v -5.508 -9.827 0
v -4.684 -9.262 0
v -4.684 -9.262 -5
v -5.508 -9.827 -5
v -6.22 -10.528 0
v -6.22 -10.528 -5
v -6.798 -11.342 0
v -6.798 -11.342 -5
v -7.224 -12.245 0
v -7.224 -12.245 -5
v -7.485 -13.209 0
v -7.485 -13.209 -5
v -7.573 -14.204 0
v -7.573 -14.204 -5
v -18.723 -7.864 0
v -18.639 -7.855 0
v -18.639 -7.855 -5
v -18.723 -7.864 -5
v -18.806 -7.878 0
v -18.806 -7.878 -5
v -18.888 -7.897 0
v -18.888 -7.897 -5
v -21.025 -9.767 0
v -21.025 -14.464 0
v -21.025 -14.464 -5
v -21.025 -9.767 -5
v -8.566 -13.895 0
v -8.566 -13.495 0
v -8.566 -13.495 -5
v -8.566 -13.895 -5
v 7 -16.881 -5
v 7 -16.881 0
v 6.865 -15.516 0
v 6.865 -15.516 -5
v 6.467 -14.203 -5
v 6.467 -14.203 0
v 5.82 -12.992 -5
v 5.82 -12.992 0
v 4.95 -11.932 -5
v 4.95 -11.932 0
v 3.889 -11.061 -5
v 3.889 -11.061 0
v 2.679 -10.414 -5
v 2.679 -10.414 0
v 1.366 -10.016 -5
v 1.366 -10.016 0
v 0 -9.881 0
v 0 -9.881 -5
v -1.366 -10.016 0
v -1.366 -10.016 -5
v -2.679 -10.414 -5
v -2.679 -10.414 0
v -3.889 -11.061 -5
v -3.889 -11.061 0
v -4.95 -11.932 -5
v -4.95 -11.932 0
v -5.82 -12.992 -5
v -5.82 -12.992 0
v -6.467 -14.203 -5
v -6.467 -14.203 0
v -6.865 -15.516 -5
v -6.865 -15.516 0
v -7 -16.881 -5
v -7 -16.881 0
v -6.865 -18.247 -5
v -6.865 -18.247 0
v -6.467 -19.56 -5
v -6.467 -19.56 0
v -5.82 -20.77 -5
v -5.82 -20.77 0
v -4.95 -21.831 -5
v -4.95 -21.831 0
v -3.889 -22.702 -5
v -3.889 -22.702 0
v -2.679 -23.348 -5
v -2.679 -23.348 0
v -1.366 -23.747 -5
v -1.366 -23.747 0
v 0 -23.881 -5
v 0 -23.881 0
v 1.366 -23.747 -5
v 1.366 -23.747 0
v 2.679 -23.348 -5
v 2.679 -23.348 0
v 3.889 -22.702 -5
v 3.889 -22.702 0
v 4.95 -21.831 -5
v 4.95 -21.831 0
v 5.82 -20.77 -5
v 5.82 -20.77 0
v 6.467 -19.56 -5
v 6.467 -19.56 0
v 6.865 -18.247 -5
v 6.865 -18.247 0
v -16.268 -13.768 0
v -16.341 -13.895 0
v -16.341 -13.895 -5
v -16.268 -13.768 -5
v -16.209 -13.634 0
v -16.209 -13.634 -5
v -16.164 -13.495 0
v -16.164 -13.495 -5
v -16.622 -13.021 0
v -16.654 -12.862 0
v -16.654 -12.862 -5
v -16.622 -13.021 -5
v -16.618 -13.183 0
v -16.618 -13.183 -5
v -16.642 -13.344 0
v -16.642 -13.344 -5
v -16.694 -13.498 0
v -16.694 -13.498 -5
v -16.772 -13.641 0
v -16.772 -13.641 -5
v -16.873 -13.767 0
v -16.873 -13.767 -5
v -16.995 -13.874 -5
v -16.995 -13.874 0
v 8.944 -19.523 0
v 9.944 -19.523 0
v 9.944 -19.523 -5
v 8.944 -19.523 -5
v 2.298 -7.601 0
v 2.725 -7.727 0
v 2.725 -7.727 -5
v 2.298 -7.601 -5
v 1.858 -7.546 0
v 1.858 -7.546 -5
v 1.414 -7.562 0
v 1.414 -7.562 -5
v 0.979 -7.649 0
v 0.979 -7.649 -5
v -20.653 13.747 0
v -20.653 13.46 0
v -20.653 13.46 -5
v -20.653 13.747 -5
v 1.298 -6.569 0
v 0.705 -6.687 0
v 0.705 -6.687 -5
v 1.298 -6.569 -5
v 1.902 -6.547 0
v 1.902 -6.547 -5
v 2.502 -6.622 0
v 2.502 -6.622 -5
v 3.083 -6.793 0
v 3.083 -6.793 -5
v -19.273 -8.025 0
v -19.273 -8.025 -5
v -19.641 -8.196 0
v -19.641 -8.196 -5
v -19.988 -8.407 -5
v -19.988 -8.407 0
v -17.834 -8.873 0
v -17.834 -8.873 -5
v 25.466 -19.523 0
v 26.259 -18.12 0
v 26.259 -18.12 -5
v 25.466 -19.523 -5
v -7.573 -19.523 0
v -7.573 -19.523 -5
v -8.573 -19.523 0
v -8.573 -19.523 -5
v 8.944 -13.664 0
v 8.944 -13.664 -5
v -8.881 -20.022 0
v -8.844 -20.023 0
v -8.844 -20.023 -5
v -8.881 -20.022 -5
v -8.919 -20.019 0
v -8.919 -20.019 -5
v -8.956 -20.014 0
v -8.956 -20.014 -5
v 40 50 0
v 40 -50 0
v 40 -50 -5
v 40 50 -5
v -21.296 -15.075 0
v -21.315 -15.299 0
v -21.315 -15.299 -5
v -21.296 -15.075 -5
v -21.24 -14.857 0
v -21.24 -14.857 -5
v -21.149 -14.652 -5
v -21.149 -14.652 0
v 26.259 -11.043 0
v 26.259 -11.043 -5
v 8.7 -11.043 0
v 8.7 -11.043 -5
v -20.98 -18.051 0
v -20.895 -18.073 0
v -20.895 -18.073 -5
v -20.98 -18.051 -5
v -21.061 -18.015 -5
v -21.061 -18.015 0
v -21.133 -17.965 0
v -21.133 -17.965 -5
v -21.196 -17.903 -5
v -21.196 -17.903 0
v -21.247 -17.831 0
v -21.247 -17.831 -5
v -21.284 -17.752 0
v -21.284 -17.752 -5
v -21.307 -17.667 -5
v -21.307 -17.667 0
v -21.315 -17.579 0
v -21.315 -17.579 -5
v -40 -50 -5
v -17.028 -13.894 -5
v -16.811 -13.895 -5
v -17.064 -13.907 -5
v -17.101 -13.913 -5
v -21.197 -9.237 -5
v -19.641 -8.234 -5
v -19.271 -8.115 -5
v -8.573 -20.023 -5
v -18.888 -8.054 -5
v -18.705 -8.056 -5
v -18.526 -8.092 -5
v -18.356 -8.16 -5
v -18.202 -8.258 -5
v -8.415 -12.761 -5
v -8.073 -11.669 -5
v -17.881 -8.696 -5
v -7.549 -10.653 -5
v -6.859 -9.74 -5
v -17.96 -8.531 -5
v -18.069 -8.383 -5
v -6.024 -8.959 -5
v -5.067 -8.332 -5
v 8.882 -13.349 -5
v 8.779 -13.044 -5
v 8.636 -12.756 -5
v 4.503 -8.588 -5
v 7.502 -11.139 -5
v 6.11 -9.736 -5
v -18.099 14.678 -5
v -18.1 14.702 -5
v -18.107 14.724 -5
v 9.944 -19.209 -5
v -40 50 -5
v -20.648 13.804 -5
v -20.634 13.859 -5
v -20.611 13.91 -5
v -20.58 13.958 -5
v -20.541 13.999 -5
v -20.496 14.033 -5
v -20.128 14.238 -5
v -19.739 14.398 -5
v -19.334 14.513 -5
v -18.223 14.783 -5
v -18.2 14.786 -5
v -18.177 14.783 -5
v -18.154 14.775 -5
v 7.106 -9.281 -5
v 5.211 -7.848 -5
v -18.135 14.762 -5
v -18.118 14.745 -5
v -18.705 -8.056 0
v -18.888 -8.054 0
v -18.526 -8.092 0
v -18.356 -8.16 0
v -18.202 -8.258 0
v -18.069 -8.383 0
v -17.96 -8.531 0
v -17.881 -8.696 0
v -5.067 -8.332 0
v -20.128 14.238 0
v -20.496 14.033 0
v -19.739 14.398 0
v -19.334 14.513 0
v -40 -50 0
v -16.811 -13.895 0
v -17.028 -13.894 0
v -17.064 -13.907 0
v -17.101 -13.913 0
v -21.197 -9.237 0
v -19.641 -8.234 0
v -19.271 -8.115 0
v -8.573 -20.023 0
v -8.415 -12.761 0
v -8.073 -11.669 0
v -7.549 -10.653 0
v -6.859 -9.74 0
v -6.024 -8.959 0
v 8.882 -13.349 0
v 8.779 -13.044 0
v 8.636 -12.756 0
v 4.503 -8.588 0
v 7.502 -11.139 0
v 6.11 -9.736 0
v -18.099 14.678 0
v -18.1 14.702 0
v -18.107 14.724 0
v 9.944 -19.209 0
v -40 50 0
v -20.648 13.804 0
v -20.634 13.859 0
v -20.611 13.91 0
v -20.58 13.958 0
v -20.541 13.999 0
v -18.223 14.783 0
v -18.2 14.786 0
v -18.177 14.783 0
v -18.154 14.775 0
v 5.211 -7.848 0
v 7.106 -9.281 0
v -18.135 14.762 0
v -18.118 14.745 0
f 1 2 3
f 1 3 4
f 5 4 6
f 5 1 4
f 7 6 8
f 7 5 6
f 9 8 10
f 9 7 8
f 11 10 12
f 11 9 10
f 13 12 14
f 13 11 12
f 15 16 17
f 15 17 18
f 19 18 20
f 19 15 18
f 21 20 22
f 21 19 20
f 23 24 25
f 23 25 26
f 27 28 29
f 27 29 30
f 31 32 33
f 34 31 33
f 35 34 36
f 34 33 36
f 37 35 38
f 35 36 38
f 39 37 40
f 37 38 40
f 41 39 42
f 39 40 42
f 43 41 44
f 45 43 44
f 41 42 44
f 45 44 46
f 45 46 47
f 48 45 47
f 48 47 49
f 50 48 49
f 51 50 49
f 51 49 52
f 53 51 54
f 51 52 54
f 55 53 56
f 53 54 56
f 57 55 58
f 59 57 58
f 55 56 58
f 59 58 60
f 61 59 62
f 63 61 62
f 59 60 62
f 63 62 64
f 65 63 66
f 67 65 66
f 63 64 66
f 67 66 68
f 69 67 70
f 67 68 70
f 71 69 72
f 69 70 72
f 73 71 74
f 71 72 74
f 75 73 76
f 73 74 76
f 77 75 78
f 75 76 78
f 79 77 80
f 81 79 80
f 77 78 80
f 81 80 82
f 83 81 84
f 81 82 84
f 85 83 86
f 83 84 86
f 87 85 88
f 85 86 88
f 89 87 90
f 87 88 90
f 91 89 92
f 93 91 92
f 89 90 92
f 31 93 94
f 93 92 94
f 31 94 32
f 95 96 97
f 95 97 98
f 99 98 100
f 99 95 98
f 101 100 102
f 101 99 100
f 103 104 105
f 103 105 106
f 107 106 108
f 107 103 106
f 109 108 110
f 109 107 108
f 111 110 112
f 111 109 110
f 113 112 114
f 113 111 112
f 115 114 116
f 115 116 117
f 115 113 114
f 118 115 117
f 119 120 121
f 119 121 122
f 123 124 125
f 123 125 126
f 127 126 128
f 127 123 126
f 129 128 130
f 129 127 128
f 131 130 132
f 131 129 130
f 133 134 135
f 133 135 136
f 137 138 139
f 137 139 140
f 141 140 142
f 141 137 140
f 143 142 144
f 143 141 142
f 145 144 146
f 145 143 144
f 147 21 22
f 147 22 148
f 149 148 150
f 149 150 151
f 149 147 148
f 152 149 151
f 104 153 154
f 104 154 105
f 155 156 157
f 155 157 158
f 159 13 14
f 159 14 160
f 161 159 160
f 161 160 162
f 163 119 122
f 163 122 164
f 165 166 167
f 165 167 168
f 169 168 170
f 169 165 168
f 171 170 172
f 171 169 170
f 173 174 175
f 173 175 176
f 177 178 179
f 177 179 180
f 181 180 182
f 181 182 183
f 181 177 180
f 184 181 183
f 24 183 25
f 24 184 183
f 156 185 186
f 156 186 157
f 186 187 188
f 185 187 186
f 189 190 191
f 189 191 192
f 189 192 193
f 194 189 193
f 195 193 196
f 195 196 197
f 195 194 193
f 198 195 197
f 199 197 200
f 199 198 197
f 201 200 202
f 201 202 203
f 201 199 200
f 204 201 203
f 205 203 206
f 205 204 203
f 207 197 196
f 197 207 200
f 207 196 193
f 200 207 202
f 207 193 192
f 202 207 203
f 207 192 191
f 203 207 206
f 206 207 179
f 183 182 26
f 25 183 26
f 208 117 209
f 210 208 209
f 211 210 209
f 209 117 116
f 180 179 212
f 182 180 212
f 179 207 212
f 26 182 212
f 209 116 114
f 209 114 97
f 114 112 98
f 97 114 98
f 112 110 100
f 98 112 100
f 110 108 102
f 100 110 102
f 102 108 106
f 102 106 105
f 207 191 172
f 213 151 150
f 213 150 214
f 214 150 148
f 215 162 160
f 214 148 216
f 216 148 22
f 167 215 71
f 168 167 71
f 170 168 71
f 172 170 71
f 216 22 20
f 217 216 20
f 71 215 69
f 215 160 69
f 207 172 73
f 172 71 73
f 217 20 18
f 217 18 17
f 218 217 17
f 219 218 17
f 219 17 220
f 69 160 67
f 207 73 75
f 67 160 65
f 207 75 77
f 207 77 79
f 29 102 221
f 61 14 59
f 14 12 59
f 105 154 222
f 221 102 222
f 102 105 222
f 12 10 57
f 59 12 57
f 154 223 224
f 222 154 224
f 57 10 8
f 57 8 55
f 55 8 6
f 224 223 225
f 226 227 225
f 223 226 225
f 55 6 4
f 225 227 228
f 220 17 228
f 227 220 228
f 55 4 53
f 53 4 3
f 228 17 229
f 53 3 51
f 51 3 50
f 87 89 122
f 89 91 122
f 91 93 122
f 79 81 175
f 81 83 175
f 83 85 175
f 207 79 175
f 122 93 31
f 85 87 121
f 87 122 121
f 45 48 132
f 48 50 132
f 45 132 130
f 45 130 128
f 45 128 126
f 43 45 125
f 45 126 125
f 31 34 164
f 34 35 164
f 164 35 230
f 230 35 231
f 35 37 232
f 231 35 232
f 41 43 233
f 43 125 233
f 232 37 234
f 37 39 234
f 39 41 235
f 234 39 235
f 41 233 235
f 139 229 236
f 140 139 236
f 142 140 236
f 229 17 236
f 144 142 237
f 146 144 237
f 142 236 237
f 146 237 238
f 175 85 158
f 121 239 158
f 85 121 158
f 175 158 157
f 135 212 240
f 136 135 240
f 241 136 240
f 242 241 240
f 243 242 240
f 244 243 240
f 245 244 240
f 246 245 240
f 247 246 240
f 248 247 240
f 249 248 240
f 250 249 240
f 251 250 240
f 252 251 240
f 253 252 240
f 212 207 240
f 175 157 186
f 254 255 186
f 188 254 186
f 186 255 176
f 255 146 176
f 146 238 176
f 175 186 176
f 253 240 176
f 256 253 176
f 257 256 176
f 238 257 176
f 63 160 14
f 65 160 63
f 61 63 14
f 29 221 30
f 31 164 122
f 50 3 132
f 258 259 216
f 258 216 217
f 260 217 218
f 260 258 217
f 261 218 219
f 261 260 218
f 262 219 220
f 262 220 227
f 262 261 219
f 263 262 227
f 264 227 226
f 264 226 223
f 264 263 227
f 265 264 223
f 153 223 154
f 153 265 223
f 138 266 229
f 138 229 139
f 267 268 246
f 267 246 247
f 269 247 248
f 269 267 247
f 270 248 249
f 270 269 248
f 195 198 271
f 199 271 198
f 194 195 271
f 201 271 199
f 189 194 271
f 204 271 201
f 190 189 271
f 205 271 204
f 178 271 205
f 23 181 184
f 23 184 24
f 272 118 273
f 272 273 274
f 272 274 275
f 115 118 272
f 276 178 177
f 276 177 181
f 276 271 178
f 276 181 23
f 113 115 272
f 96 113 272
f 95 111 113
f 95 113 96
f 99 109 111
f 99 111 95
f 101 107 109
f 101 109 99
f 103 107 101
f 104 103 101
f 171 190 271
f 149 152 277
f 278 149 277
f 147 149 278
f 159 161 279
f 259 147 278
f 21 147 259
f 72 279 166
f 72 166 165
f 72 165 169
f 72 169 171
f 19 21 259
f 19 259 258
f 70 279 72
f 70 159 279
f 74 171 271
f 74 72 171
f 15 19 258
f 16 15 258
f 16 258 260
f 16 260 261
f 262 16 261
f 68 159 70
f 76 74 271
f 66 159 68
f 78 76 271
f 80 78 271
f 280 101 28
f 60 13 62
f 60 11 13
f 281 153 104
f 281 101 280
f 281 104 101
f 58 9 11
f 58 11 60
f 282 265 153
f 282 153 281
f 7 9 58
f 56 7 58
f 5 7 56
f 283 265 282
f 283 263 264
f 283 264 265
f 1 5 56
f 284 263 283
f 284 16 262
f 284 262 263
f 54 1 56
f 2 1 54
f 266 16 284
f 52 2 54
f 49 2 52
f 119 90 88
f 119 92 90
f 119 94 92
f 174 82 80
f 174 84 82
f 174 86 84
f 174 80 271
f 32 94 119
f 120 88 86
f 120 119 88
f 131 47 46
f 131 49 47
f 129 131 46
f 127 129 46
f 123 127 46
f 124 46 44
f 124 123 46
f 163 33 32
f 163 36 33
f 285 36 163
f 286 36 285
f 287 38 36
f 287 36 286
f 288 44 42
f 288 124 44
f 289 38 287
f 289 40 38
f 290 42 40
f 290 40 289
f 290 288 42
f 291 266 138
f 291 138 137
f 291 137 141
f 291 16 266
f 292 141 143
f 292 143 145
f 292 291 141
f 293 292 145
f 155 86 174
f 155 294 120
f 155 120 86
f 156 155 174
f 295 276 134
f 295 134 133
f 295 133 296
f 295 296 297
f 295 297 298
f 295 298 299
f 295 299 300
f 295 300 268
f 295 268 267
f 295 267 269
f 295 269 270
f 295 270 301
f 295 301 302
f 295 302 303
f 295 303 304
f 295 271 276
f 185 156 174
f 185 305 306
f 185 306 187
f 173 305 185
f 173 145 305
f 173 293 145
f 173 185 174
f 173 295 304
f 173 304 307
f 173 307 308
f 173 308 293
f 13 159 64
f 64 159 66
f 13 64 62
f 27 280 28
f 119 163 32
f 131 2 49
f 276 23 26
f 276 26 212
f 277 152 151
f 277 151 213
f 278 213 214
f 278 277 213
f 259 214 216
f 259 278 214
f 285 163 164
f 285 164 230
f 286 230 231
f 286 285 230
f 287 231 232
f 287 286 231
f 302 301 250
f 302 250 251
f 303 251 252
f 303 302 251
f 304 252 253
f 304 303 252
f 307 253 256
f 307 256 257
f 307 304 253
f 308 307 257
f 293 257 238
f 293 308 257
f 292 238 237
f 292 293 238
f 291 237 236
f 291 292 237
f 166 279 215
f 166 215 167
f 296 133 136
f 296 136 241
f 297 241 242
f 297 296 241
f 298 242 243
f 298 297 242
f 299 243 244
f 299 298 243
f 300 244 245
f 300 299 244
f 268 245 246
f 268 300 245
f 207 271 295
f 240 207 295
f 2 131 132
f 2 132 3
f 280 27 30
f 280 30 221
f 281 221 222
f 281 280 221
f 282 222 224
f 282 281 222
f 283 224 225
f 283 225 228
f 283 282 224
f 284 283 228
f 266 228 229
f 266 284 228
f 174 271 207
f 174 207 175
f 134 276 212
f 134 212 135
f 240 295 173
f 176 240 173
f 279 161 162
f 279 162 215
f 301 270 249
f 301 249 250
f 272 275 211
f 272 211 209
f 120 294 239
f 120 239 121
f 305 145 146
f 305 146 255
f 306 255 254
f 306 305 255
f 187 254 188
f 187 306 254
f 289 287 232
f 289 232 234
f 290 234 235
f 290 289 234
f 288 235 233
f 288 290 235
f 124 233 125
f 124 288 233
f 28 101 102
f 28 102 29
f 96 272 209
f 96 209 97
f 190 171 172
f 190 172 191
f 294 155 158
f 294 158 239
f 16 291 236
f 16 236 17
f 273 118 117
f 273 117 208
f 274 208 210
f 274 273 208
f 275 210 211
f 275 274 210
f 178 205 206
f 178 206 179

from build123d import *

# Parameters (mm, degrees)
F0_W     = 80
F0_H     = 100
F0_R     = 7
F1_DEPTH = 5


with BuildPart() as f1:
    # F0 (on Top) → F1 (new body)
    with BuildSketch(Plane.XY):
        Rectangle(F0_W, F0_H)
        with Locations((0, -16.881289)):
            Circle(F0_R, mode=Mode.SUBTRACT)
        with BuildLine():
            Line((-7.573214, -14.20428), (-7.573214, -19.523358))
            Line((-7.573214, -19.523358), (-8.573214, -19.523358))
            Line((-8.573214, -19.523358), (-8.573214, -20.023358))
            Line((-8.573214, -20.023358), (-8.843749, -20.023358))
            ThreePointArc((-8.843749, -20.023358), (-8.900117, -20.021085), (-8.956119, -20.01428))
            Line((-8.956119, -20.01428), (-20.895163, -18.072539))
            ThreePointArc((-20.895163, -18.072539), (-21.195774, -17.902958), (-21.314899, -17.579023))
            Line((-21.314899, -17.579023), (-21.314899, -17.160009))
            Line((-21.314899, -17.160009), (-21.314899, -15.299222))
            ThreePointArc((-21.314899, -15.299222), (-21.24047, -14.857391), (-21.0254, -14.464328))
            Line((-21.0254, -14.464328), (-21.0254, -14.01055))
            Line((-21.0254, -14.01055), (-21.0254, -12.913586))
            Line((-21.0254, -12.913586), (-21.0254, -9.813586))
            Line((-21.0254, -9.813586), (-21.0254, -9.767418))
            Line((-21.0254, -9.767418), (-21.197006, -9.2368))
            Line((-21.197006, -9.2368), (-20.653205, 13.45957))
            Line((-20.653205, 13.45957), (-20.653205, 13.747156))
            ThreePointArc((-20.653205, 13.747156), (-20.61125, 13.910455), (-20.495776, 14.033308))
            ThreePointArc((-20.495776, 14.033308), (-19.935874, 14.323579), (-19.334331, 14.513035))
            Line((-19.334331, 14.513035), (-18.223464, 14.782686))
            ThreePointArc((-18.223464, 14.782686), (-18.134694, 14.76198), (-18.098606, 14.678275))
            Line((-18.098606, 14.678275), (-18.638507, -7.855344))
            ThreePointArc((-18.638507, -7.855344), (-18.764323, -7.869872), (-18.888049, -7.896943))
            ThreePointArc((-18.888049, -7.896943), (-19.459477, -8.105502), (-19.987784, -8.407029))
            ThreePointArc((-19.987784, -8.407029), (-19.458243, -8.167158), (-18.888049, -8.053886))
            ThreePointArc((-18.888049, -8.053886), (-18.201931, -8.25824), (-17.834234, -8.872502))
            Line((-17.834234, -8.872502), (-16.653947, -12.861871))
            ThreePointArc((-16.653947, -12.861871), (-16.664462, -13.422165), (-16.995338, -13.874449))
            ThreePointArc((-16.995338, -13.874449), (-17.045524, -13.901224), (-17.101217, -13.912787))
            Line((-17.101217, -13.912787), (-16.810631, -13.894739))
            Line((-16.810631, -13.894739), (-16.340575, -13.894739))
            ThreePointArc((-16.340575, -13.894739), (-16.237071, -13.701517), (-16.164339, -13.494739))
            Line((-16.164339, -13.494739), (-15.217034, -13.494739))
            Line((-15.217034, -13.494739), (-14.968154, -13.494739))
            Line((-14.968154, -13.494739), (-8.566029, -13.494739))
            Line((-8.566029, -13.494739), (-8.566029, -13.894739))
            ThreePointArc((-8.566029, -13.894739), (-7.549092, -10.652508), (-5.067064, -8.331785))
            Line((-5.067064, -8.331785), (0.704507, -6.687392))
            ThreePointArc((0.704507, -6.687392), (1.902164, -6.547103), (3.082686, -6.792931))
            ThreePointArc((3.082686, -6.792931), (6.192475, -8.520067), (8.700256, -11.042926))
            Line((8.700256, -11.042926), (26.258714, -11.042926))
            Line((26.258714, -11.042926), (26.258714, -14.213515))
            Line((26.258714, -14.213515), (26.258714, -18.120132))
            Line((26.258714, -18.120132), (25.466068, -19.523358))
            Line((25.466068, -19.523358), (9.943894, -19.209119))
            Line((9.943894, -19.209119), (9.943894, -19.523358))
            Line((9.943894, -19.523358), (8.943894, -19.523358))
            Line((8.943894, -19.523358), (8.943894, -13.664436))
            ThreePointArc((8.943894, -13.664436), (8.835951, -13.194662), (8.636425, -12.755881))
            ThreePointArc((8.636425, -12.755881), (6.1104, -9.735893), (2.724563, -7.726606))
            ThreePointArc((2.724563, -7.726606), (1.857829, -7.54612), (0.978515, -7.649119))
            Line((0.978515, -7.649119), (-4.684119, -9.262475))
            ThreePointArc((-4.684119, -9.262475), (-6.797948, -11.342099), (-7.573214, -14.20428))
        make_face(mode=Mode.SUBTRACT)
    extrude(amount=-F1_DEPTH)


solid = f1.part
